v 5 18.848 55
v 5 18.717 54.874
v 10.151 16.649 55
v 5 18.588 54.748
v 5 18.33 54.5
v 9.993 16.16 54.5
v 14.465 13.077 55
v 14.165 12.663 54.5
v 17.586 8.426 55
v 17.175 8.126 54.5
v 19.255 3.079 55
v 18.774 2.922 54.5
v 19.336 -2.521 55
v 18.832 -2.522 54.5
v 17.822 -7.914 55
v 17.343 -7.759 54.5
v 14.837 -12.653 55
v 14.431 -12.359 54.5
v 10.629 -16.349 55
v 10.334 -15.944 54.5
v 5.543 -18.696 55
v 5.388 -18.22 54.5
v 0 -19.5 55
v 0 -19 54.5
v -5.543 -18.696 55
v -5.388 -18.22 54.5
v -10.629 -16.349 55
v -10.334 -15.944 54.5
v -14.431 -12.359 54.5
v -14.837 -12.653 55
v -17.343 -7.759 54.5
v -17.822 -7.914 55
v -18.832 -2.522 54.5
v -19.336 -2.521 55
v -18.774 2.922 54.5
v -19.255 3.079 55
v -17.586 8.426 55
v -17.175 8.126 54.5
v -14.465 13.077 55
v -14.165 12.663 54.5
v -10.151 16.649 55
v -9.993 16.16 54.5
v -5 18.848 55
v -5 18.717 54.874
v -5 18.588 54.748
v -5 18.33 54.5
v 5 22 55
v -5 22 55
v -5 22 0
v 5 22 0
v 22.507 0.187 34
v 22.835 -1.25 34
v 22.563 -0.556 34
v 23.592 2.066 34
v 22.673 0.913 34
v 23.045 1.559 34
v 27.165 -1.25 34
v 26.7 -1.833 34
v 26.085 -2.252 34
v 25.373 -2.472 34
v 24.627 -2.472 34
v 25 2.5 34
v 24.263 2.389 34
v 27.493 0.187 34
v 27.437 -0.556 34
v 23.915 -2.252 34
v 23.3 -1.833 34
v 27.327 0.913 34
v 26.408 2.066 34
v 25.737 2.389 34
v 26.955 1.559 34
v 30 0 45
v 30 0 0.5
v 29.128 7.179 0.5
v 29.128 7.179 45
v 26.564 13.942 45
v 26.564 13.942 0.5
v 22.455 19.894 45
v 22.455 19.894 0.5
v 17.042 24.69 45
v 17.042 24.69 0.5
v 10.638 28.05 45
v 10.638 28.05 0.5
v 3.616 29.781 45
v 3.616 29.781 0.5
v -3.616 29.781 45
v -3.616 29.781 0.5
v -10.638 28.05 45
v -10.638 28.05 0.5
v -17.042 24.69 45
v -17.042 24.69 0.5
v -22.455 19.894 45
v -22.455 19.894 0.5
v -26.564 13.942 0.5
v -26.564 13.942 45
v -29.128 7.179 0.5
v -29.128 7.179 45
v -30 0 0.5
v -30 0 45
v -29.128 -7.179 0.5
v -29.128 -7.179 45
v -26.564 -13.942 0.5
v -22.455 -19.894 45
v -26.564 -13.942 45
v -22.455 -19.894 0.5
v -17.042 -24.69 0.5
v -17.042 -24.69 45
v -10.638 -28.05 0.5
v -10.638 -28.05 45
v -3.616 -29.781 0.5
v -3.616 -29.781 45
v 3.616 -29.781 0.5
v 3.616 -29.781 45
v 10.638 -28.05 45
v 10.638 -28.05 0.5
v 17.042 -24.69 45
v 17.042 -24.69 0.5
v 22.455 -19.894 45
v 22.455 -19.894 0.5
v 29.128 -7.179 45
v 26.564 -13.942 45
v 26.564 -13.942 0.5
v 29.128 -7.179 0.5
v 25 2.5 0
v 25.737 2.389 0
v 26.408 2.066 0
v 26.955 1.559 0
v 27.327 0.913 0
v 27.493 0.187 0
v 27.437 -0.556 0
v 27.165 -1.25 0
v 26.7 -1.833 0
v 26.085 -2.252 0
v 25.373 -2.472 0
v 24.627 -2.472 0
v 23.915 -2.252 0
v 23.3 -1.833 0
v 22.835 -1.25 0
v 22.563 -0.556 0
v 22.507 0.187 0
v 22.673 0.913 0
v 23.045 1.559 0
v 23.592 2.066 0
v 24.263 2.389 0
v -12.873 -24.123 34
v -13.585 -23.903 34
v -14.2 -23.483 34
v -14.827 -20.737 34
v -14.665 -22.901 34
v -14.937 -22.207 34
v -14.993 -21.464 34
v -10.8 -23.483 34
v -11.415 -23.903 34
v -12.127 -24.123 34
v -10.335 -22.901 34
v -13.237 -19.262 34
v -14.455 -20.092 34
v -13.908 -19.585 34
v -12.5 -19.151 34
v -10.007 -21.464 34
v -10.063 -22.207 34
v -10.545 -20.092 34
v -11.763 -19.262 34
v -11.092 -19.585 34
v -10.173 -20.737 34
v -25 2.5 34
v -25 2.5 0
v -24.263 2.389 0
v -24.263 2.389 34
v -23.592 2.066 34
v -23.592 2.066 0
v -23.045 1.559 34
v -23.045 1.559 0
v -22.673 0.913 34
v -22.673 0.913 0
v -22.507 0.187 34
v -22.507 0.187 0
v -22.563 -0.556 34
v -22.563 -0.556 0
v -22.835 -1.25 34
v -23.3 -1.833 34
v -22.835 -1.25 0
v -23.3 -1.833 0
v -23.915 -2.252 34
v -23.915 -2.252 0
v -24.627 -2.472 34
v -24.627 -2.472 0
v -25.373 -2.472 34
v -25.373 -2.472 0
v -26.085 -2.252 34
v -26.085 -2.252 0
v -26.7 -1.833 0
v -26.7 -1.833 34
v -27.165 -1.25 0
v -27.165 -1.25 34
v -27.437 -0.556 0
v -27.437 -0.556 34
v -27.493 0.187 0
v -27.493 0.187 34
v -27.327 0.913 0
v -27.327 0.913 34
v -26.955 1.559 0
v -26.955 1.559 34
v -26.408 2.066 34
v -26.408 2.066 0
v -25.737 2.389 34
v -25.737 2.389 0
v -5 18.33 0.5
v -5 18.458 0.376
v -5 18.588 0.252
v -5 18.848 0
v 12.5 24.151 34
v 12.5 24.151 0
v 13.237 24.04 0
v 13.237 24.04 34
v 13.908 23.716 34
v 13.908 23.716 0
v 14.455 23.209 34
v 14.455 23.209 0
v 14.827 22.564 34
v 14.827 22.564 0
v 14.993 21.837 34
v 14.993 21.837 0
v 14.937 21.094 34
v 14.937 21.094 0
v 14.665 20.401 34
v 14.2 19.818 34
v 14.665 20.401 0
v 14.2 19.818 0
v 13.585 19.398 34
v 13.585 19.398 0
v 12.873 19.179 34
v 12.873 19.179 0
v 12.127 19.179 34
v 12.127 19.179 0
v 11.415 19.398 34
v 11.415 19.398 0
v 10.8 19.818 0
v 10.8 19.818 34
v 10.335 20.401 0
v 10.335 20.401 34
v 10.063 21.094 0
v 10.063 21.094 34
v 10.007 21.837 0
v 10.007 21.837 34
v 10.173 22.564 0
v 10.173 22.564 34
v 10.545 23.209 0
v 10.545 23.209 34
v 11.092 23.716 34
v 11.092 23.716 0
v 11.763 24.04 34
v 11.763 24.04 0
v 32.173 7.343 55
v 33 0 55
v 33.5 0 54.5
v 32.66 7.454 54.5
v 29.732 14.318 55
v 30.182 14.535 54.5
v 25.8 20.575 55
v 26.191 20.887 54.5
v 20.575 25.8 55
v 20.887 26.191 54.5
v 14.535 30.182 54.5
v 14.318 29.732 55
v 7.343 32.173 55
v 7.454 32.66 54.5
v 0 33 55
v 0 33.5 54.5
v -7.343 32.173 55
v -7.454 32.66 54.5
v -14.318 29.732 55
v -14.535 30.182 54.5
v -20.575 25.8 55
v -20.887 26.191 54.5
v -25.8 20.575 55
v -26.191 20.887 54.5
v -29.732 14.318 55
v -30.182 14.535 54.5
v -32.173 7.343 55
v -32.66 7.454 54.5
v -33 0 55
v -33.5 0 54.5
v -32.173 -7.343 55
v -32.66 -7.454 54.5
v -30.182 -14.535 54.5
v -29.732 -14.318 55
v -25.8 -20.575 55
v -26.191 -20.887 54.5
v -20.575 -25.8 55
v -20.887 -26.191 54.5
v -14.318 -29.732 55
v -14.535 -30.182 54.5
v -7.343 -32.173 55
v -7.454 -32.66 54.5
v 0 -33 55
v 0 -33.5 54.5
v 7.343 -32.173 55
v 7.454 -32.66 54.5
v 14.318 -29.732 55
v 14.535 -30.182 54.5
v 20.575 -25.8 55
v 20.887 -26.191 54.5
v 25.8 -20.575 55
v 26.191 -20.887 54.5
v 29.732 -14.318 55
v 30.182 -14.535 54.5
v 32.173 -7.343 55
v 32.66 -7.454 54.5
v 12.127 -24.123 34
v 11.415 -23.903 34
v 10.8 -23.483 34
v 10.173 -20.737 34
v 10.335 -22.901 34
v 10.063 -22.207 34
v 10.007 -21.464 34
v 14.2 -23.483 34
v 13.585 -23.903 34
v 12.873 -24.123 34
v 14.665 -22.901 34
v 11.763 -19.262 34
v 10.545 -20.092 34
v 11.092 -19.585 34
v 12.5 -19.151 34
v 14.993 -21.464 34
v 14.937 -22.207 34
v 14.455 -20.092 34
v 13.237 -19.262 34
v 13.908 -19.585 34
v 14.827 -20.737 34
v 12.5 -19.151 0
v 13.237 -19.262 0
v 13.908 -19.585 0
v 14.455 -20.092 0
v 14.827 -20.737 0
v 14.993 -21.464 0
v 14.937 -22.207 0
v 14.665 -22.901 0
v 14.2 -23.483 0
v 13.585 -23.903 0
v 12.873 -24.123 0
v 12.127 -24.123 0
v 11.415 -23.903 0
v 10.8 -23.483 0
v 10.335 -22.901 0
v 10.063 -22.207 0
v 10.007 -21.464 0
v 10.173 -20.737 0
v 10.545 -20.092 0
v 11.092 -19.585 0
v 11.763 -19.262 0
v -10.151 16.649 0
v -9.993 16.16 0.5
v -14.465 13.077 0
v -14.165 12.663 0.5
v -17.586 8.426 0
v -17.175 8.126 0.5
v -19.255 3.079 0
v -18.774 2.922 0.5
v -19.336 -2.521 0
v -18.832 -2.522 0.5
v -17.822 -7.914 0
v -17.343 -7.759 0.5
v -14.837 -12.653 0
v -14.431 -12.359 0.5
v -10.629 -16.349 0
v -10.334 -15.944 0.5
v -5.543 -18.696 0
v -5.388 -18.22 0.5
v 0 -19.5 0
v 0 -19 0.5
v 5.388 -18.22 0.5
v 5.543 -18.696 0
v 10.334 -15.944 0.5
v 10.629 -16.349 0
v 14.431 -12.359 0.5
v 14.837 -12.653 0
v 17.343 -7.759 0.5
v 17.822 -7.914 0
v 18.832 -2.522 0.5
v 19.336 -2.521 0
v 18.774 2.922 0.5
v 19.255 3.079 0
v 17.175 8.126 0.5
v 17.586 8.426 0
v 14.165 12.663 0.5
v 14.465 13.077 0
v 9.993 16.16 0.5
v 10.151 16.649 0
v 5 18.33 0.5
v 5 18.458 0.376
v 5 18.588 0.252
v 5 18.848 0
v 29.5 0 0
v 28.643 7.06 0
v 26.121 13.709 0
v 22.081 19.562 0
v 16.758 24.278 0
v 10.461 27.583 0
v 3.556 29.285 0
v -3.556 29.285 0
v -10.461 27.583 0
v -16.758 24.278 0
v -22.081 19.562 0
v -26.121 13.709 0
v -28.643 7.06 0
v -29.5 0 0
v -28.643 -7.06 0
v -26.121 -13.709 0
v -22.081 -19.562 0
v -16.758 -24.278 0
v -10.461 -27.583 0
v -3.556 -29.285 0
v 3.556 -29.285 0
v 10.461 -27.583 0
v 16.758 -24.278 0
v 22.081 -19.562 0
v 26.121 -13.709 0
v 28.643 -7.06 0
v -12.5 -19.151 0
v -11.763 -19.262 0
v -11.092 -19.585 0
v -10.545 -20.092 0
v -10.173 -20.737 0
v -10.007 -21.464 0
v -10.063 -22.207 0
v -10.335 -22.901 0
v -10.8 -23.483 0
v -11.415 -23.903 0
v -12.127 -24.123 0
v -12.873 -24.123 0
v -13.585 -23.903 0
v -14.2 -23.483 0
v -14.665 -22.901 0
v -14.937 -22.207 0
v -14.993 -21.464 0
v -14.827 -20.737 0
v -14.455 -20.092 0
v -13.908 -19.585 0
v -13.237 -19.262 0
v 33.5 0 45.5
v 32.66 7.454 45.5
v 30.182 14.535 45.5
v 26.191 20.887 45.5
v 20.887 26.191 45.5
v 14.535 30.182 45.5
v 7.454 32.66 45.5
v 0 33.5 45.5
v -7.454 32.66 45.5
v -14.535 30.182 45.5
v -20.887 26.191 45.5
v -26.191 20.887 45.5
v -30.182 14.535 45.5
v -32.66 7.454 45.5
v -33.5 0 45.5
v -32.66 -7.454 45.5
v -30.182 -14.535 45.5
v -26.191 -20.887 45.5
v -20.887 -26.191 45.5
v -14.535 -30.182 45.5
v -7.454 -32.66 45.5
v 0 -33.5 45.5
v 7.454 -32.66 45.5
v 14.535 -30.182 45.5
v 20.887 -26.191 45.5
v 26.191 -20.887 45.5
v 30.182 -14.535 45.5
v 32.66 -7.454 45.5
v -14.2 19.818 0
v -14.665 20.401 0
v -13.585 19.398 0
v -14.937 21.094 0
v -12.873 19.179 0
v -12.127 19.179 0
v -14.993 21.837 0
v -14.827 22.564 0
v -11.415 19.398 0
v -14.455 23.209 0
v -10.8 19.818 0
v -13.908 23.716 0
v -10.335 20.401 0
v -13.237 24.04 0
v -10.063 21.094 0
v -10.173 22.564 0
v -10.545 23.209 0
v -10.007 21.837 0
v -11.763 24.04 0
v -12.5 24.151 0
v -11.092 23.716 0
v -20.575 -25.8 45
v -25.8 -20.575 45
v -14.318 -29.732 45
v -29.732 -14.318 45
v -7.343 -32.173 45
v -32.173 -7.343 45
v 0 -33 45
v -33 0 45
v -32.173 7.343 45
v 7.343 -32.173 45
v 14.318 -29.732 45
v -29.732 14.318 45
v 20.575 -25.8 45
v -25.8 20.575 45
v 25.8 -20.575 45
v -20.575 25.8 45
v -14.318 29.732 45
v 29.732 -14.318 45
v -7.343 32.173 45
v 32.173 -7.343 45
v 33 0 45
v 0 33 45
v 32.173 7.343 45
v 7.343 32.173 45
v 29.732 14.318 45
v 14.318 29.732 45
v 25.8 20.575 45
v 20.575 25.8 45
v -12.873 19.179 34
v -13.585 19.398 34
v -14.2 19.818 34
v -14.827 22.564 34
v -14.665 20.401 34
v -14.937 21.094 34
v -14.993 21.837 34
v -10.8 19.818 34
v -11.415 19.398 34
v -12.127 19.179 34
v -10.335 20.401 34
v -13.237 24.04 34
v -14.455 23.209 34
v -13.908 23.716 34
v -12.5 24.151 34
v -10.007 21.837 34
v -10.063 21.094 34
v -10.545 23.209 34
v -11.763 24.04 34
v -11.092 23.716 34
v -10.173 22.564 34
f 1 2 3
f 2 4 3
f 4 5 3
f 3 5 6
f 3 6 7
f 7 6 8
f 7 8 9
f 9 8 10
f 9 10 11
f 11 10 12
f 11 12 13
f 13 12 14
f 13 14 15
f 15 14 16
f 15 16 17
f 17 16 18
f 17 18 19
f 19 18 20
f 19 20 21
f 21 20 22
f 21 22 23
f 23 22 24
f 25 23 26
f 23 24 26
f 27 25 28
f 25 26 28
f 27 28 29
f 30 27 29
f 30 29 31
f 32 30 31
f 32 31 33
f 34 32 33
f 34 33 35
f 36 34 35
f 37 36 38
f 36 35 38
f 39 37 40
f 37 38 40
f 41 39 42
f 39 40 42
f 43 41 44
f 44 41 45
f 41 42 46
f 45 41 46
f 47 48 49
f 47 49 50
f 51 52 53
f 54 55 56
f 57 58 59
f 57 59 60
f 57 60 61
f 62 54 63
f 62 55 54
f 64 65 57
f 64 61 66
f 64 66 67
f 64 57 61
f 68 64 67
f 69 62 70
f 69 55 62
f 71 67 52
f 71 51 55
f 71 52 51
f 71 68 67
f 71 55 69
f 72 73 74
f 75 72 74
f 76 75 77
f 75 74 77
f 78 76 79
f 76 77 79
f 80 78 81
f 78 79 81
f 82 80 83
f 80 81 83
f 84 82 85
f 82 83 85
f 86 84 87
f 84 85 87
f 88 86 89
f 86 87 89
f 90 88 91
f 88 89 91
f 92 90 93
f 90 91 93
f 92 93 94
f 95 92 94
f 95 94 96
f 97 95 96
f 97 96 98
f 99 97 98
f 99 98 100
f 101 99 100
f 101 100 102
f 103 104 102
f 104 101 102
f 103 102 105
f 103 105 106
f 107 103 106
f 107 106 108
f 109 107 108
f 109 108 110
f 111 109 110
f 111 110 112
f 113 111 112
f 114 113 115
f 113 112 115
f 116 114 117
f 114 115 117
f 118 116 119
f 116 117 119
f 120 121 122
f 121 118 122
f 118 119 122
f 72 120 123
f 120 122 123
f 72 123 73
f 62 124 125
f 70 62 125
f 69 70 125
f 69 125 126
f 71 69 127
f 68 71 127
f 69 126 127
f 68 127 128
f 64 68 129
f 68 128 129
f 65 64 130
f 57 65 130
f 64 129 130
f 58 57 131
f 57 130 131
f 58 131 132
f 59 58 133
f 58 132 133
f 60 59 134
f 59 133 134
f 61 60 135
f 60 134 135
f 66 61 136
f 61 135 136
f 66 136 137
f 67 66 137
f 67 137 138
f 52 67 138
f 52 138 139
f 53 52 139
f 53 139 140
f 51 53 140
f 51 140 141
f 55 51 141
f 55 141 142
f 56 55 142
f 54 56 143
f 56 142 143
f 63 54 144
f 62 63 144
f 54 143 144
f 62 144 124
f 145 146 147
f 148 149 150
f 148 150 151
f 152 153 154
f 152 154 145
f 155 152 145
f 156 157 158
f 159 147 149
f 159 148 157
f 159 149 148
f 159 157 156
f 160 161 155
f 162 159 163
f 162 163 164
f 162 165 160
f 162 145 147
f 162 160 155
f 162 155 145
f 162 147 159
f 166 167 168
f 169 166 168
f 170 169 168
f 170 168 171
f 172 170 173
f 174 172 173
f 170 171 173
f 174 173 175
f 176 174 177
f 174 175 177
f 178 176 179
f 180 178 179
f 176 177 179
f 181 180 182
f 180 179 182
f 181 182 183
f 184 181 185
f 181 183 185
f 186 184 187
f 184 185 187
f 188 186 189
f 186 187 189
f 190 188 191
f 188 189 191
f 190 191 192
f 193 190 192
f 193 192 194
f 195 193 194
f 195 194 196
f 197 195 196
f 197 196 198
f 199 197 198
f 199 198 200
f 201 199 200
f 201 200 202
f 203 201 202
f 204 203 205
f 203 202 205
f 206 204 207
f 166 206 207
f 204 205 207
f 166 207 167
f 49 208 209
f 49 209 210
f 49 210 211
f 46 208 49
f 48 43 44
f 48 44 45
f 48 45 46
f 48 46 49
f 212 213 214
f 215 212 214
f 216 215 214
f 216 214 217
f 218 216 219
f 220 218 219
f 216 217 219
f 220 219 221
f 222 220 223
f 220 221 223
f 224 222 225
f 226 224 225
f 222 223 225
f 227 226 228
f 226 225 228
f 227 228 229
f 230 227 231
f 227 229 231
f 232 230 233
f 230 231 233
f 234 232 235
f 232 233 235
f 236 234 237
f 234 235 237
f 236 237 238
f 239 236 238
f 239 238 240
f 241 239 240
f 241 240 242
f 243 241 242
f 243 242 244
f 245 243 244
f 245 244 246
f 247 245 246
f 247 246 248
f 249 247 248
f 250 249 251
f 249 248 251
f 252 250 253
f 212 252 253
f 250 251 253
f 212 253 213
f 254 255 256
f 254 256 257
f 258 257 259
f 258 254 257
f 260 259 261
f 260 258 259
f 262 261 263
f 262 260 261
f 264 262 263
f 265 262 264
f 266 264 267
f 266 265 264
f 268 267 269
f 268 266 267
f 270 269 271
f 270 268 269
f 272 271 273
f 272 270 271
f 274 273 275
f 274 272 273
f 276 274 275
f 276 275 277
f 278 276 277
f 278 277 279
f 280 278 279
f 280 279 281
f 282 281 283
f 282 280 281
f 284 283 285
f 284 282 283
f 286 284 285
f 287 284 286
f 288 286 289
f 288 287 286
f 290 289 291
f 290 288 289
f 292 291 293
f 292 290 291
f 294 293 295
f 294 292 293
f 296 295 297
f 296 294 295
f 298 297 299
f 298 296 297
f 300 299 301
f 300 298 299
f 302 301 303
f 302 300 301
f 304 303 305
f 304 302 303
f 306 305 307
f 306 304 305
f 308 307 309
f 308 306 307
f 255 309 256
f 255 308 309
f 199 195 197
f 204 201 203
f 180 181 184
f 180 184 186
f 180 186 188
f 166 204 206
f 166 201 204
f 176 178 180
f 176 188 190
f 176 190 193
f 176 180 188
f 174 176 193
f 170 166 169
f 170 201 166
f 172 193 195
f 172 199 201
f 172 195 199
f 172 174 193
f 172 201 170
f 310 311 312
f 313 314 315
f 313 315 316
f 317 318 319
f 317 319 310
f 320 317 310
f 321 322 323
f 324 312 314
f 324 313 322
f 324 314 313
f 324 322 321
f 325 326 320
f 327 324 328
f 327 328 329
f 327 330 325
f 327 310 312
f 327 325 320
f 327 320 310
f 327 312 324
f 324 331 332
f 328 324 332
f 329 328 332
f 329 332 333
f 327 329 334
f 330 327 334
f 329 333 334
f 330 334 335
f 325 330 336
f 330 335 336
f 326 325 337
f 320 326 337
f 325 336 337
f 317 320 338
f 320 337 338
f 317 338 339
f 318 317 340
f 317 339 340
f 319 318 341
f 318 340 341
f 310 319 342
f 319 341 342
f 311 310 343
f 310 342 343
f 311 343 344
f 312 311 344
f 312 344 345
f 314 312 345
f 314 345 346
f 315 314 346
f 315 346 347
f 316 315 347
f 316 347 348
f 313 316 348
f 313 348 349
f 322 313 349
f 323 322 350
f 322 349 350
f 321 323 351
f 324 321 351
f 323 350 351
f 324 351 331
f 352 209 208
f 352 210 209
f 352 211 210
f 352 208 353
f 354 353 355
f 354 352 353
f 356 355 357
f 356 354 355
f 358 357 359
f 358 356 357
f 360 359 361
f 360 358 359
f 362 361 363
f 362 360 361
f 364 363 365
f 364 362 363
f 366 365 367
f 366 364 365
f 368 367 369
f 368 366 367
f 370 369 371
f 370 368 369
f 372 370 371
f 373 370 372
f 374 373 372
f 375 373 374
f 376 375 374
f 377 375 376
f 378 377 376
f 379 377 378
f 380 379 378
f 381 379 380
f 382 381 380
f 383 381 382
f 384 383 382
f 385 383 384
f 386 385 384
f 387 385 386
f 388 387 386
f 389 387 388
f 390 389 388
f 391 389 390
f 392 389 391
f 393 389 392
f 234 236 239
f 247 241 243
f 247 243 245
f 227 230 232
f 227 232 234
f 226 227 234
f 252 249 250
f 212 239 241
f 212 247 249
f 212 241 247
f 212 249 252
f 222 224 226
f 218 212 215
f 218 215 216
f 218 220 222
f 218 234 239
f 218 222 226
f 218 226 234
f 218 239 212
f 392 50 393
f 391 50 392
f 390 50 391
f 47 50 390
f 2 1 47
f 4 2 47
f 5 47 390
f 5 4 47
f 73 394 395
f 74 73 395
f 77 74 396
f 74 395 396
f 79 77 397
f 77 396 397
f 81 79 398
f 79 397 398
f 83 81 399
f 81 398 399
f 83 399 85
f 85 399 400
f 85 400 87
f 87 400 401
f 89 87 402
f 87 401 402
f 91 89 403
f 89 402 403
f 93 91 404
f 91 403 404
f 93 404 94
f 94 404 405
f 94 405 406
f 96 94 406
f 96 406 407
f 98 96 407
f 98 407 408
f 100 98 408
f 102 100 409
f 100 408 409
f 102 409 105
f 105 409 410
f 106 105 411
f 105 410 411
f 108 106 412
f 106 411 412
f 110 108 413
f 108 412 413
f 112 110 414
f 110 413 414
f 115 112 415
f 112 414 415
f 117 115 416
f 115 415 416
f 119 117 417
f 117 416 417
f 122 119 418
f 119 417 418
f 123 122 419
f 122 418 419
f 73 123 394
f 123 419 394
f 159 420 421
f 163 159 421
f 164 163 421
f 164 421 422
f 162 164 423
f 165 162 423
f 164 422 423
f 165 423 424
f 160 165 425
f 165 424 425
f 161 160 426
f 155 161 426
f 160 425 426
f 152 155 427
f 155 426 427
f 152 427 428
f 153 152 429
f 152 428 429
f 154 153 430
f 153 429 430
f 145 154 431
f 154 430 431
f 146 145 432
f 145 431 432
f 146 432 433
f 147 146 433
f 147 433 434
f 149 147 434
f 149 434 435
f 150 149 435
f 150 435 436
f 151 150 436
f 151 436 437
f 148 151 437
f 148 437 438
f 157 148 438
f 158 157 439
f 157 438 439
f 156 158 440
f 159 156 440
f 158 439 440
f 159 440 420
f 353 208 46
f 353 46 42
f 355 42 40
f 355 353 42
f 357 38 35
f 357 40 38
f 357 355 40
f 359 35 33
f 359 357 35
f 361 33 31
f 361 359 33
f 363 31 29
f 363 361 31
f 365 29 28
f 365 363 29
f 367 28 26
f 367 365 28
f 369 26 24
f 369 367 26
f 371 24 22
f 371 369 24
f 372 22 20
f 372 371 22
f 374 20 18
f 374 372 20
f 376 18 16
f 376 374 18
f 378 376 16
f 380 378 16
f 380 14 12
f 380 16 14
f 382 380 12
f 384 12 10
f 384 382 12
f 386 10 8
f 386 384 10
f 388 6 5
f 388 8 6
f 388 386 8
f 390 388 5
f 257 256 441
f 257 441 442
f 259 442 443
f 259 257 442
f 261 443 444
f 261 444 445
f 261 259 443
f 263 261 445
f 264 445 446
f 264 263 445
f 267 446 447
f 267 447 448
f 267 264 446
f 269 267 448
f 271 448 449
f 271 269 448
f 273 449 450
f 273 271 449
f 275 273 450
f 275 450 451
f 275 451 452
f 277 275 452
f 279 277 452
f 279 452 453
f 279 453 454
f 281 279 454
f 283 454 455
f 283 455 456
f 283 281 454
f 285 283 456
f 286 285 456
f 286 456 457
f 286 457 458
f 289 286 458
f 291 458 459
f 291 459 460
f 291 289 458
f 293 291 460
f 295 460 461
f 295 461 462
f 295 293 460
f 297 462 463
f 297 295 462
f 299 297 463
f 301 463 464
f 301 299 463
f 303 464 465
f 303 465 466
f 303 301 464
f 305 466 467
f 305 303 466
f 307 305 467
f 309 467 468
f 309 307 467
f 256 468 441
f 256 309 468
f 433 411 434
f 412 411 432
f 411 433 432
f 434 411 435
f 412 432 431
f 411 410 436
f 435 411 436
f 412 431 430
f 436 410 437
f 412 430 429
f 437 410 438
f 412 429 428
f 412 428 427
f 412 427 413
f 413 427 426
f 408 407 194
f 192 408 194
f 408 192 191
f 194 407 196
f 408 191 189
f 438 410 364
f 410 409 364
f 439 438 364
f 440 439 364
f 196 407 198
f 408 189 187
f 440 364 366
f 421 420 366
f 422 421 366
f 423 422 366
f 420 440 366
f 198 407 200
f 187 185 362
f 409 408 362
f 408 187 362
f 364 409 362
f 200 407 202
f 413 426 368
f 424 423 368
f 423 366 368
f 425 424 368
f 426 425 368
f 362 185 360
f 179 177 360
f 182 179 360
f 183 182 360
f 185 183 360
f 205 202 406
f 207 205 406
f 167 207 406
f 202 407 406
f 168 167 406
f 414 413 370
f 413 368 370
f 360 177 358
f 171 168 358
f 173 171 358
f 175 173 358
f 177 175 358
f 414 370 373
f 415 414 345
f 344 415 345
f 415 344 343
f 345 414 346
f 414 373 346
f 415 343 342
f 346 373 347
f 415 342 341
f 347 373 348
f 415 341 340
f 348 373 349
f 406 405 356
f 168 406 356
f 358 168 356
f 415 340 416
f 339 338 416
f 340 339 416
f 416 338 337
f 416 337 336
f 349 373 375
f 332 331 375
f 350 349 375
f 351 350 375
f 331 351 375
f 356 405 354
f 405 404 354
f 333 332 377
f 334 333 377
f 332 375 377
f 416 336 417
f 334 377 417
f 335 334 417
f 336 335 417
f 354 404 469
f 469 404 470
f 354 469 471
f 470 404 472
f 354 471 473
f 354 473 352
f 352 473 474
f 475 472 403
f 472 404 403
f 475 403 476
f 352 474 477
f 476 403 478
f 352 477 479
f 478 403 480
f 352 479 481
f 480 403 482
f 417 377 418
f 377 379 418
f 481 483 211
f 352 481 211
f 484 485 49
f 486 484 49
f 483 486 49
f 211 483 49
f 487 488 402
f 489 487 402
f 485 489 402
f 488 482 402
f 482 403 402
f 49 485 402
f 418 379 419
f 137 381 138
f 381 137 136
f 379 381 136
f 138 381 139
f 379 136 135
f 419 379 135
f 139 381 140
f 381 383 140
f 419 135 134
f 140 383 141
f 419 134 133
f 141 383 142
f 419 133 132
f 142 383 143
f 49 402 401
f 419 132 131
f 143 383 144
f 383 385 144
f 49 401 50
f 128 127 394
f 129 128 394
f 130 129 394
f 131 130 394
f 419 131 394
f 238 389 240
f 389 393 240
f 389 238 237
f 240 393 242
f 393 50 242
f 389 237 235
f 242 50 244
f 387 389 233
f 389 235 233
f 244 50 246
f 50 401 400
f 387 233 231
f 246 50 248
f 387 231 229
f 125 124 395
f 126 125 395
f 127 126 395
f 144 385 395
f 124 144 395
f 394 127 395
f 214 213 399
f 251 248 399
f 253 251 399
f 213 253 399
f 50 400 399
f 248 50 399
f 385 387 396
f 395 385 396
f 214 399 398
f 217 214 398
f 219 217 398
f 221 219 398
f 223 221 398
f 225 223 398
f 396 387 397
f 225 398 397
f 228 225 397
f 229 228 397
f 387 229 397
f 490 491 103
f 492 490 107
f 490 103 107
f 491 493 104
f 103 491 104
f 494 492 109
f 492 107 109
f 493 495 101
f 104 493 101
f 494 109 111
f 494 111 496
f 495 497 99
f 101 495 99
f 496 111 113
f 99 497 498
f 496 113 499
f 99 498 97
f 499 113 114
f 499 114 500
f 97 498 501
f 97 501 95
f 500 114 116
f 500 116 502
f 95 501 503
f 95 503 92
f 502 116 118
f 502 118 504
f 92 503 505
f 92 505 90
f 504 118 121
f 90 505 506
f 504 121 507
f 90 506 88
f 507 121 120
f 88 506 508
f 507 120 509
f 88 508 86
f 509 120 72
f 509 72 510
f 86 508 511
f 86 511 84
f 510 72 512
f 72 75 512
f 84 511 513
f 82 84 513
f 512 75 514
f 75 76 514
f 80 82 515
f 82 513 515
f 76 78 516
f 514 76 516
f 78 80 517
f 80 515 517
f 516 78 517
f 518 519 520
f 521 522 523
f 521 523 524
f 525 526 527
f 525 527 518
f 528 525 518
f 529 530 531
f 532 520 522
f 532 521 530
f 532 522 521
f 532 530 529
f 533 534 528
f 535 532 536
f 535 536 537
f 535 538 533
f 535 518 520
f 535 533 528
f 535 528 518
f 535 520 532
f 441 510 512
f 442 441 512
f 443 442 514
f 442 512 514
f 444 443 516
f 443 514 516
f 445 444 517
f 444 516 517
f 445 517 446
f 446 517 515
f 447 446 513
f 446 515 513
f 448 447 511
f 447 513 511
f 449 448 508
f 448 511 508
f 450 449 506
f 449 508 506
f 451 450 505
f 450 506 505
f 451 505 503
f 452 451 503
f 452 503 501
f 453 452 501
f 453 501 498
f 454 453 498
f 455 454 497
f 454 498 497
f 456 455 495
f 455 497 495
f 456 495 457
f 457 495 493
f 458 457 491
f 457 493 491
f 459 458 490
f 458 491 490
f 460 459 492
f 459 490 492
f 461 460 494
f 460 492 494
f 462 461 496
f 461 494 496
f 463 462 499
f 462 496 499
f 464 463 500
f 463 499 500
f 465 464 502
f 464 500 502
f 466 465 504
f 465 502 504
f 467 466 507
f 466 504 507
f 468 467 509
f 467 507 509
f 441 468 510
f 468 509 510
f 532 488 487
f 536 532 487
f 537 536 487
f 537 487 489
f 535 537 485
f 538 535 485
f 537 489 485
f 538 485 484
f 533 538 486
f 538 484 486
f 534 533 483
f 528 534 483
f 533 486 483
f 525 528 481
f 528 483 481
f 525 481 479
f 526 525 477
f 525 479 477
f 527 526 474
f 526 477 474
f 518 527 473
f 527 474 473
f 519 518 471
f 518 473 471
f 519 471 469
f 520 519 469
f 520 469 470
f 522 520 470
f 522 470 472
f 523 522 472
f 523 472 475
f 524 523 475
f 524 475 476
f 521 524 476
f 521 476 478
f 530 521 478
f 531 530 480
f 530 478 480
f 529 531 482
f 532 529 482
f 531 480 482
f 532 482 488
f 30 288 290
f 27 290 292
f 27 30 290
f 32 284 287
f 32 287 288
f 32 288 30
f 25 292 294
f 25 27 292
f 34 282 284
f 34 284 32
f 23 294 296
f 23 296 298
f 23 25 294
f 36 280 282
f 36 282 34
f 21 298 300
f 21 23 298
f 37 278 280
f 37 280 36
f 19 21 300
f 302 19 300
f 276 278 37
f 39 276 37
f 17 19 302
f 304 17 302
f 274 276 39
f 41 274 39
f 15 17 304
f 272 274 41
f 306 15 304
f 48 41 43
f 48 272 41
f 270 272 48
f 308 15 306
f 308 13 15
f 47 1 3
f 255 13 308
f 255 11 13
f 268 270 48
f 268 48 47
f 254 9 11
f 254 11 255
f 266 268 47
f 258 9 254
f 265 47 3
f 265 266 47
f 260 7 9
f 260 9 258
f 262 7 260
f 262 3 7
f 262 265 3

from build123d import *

# Parameters (mm, degrees)
SKETCH_1_R          = 30
SKETCH_1_R_2        = 19
EXTRUDE_1_DEPTH     = 55
CUT_EXTRUDE_1_DEPTH = 70.462219947
SKETCH_3_R          = 33.5
SKETCH_3_R_2        = 27.5
EXTRUDE_2_DEPTH     = 10
SKETCH_4_R          = 2.5
CUT_EXTRUDE_2_DEPTH = 34
CHAMFER_1_SIZE      = 0.5


with BuildPart() as part:
    # 草图1 → 拉伸1 (new body)
    with BuildSketch(Plane.XY):
        Circle(SKETCH_1_R)
        Circle(SKETCH_1_R_2, mode=Mode.SUBTRACT)
    extrude(amount=EXTRUDE_1_DEPTH)

    # 草图2 → 切除-拉伸1 (cut, through all)
    with BuildSketch(Plane.XY.offset(55)):
        with BuildLine():
            Line((5, 19), (5, 18.33030278))
            ThreePointArc((5, 18.33030278), (0, 19), (-5, 18.33030278))
            Line((-5, 18.33030278), (-5, 19))
            Line((-5, 19), (-5, 22))
            Line((-5, 22), (5, 22))
            Line((5, 22), (5, 19))
        make_face()
    extrude(amount=-CUT_EXTRUDE_1_DEPTH, mode=Mode.SUBTRACT)

    # 草图3 → 拉伸2 (add)
    with BuildSketch(Plane.XY.offset(55)):
        Circle(SKETCH_3_R)
        Circle(SKETCH_3_R_2, mode=Mode.SUBTRACT)
    extrude(amount=-EXTRUDE_2_DEPTH)

    # 草图4 → 切除-拉伸2 (cut)
    with BuildSketch(Plane(origin=(0, 0, 0), x_dir=(-1, 0, 0), z_dir=(0, 0, -1))):
        with Locations(Location((12.5, 21.650635095, 0), (0, 0, 90))):
            Circle(SKETCH_4_R)
        with Locations(Location((25, 0, 0), (0, 0, 90))):
            Circle(SKETCH_4_R)
        with Locations(Location((12.5, -21.650635095, 0), (0, 0, 90))):
            Circle(SKETCH_4_R)
        with Locations(Location((-12.5, -21.650635095, 0), (0, 0, 90))):
            Circle(SKETCH_4_R)
        with Locations(Location((-25, 0, 0), (0, 0, 90))):
            Circle(SKETCH_4_R)
        with Locations(Location((-12.5, 21.650635095, 0), (0, 0, 90))):
            Circle(SKETCH_4_R)
    extrude(amount=-CUT_EXTRUDE_2_DEPTH, mode=Mode.SUBTRACT)

    # 倒角1
    chamfer_1_edges = [part.edges().sort_by_distance(p)[0] for p in [
        (0, -19, 0),
        (-30, 0, 0),
        (-33.5, 0, 55),
        (-33.5, 0, 45),
        (0, -19, 55),
    ]]
    chamfer(chamfer_1_edges, length=CHAMFER_1_SIZE)


solid = part.part
